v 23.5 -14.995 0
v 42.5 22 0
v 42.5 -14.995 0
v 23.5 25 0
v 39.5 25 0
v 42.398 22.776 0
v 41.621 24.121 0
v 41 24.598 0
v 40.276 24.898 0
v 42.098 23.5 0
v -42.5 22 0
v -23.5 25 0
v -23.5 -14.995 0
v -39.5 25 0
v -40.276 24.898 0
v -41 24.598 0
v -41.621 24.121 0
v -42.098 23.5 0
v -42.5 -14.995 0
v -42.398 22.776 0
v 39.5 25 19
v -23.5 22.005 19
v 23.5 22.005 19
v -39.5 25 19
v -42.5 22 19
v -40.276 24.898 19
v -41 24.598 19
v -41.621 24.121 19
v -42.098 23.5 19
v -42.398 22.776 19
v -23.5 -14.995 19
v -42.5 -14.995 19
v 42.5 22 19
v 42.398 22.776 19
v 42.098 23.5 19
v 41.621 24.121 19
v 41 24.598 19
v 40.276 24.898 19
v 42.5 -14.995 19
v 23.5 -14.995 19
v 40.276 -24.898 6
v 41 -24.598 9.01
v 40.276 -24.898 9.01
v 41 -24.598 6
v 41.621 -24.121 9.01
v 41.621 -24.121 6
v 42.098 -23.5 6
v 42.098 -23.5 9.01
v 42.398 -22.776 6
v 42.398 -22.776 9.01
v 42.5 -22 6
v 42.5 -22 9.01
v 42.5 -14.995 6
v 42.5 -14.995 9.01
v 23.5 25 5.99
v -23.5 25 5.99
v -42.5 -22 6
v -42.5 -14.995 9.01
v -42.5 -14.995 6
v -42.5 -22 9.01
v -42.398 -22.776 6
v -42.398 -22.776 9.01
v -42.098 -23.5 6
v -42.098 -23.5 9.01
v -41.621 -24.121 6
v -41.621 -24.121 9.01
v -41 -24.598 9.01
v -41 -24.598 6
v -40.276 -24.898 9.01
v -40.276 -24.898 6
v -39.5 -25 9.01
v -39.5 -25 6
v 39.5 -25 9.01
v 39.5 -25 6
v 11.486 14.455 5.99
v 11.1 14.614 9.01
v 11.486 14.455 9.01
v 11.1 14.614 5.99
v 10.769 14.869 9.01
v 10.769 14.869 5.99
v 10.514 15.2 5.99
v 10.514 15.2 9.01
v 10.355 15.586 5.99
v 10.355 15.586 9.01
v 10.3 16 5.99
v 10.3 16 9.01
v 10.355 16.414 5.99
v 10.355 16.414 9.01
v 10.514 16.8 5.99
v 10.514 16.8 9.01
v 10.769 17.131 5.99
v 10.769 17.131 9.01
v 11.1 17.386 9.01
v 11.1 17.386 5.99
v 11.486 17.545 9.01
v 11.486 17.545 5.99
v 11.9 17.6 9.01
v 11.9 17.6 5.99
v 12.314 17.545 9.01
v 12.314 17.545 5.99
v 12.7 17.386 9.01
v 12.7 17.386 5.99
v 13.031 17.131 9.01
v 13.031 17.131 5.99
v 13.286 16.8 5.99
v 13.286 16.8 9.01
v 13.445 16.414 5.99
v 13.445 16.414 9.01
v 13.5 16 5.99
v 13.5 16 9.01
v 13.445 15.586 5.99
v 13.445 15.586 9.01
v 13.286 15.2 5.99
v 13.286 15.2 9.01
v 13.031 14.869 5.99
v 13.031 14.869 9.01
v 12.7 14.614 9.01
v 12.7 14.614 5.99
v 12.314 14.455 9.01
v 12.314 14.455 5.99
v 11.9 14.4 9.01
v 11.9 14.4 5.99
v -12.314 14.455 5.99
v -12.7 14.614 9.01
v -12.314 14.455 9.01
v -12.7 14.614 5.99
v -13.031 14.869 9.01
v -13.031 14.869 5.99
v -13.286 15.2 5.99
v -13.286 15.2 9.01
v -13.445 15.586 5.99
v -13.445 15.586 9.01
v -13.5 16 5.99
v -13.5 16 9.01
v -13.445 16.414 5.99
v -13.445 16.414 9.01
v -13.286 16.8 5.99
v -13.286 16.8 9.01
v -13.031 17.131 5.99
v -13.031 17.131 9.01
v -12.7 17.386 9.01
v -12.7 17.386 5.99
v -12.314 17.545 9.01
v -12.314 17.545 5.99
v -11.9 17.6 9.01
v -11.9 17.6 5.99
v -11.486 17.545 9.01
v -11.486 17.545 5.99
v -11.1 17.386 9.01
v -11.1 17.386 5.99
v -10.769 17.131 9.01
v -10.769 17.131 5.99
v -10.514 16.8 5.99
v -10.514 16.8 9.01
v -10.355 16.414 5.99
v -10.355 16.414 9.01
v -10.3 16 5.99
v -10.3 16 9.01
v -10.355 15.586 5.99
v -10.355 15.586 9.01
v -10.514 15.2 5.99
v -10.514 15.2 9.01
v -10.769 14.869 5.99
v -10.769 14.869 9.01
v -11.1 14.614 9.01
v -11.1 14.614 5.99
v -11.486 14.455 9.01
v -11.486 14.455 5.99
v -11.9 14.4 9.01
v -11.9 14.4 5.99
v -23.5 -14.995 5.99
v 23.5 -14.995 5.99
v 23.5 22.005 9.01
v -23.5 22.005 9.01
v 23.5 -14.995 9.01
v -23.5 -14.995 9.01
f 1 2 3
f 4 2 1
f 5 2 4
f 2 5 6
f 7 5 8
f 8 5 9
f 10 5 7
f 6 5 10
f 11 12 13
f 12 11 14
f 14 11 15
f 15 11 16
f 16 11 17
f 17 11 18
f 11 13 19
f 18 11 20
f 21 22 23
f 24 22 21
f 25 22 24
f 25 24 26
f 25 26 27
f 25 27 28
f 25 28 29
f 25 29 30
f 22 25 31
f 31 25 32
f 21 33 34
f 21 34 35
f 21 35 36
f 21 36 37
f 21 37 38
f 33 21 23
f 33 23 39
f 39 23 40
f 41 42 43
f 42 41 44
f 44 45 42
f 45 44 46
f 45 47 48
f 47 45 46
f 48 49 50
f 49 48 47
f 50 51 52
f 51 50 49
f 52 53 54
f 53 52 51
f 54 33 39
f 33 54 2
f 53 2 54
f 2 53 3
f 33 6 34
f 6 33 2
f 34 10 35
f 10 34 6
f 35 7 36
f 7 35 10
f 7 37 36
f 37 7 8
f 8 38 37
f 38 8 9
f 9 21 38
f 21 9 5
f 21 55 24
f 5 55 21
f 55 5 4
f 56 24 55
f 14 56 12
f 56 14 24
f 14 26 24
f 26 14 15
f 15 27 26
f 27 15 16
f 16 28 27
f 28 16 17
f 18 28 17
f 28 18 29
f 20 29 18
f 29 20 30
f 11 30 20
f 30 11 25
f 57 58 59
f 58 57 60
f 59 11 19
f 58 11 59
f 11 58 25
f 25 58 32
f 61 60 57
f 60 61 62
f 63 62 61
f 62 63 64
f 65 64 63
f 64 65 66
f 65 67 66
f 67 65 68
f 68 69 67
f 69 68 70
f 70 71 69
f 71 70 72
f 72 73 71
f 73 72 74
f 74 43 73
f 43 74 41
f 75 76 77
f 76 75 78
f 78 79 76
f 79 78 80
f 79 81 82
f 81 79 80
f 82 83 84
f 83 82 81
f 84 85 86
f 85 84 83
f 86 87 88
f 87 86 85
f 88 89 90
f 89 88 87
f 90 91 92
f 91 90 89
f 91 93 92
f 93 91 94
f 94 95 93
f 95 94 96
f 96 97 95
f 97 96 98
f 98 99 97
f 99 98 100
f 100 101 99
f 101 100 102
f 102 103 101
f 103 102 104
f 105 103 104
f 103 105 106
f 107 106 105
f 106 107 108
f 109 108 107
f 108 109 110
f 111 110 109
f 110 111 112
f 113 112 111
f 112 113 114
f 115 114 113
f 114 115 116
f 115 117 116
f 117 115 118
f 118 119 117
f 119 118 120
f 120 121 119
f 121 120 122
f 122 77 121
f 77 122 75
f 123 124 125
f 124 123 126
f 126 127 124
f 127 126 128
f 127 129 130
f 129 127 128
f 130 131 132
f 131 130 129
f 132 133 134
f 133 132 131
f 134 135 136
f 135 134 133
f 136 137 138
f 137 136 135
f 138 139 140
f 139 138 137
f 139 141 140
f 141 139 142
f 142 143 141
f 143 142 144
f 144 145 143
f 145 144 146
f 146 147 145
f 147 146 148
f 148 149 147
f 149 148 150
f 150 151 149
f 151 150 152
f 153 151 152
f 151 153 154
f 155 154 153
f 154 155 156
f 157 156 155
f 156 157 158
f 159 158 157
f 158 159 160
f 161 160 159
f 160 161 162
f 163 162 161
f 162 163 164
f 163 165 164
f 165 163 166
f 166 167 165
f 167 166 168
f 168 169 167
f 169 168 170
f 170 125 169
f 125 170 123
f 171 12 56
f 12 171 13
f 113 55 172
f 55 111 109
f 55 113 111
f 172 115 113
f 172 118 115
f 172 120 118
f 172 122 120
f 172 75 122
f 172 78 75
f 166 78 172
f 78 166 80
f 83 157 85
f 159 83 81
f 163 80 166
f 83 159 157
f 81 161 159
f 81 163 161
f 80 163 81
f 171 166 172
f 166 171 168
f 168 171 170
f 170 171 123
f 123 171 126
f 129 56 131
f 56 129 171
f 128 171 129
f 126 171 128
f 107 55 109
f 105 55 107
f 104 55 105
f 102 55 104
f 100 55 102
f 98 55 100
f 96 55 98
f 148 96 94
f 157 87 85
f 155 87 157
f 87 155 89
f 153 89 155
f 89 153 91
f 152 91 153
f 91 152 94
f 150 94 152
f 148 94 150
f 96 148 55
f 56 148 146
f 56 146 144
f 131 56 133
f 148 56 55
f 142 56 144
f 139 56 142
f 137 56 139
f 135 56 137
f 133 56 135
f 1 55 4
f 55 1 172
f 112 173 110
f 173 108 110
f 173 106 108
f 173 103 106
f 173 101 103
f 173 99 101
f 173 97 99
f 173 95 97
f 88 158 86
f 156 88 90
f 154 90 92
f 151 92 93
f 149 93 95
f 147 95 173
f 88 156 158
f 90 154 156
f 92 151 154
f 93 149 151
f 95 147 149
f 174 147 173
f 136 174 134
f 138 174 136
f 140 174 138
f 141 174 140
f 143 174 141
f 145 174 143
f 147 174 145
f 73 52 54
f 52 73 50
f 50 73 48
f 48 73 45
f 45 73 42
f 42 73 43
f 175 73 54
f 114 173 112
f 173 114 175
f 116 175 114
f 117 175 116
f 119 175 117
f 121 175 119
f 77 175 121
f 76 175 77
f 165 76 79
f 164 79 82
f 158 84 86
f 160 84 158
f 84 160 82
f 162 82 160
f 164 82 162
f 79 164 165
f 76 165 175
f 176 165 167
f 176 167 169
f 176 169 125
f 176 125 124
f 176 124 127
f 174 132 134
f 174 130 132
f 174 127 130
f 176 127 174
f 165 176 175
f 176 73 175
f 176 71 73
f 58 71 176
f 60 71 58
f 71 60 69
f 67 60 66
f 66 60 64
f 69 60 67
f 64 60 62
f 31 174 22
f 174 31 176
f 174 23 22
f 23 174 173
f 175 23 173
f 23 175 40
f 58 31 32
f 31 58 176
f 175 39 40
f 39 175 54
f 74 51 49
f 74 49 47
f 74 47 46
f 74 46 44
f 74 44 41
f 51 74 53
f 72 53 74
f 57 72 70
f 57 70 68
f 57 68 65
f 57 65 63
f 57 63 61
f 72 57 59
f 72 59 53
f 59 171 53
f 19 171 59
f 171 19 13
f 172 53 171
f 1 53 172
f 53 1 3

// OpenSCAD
width = 85; //mm
length = 50; //mm
thickness = 3; //mm
radius = 3; //mm
hole_offset = 9; //mm
hole_distance = 23.8; //mm
hole_diameter = 3.2; //mm
cut_out_width = 47; //mm
tooth_depth = 6; //mm
feet_depth = 10; //mm
feet_length = 40; //mm

$fn = 24;

difference() {
  linear_extrude(thickness + tooth_depth + feet_depth) {
    difference() {
      minkowski() {
        square([width - 2 * radius, length - 2 * radius], center = true);
        circle(radius);
      }
      translate([0, length / 2 - hole_offset]) {
        translate([hole_distance / 2, 0]) {
          circle(d = hole_diameter);
        }
        translate([hole_distance / -2, 0]) {
          circle(d = hole_diameter);
        }
      }
    }
  }
  translate([0, 0, -0.01]) {
    linear_extrude(tooth_depth) {
      square([cut_out_width, length + 0.01], center = true);
    }
  }
  translate([0, -thickness/2, tooth_depth + thickness + 0.01]) {
    linear_extrude(feet_depth) {
      square([cut_out_width, length - thickness + 0.01], center = true);
    }
  }
  translate([0, feet_length / -2, tooth_depth + thickness + 0.01]) {
    linear_extrude(feet_depth) {
      square([width + 0.01, length - feet_length + 0.01], center = true);
    }
  }
  translate([0, feet_length / -2, 0]) {
    linear_extrude(tooth_depth) {
      square([width + 0.01, length - feet_length + 0.01], center = true);
    }
  }
}
